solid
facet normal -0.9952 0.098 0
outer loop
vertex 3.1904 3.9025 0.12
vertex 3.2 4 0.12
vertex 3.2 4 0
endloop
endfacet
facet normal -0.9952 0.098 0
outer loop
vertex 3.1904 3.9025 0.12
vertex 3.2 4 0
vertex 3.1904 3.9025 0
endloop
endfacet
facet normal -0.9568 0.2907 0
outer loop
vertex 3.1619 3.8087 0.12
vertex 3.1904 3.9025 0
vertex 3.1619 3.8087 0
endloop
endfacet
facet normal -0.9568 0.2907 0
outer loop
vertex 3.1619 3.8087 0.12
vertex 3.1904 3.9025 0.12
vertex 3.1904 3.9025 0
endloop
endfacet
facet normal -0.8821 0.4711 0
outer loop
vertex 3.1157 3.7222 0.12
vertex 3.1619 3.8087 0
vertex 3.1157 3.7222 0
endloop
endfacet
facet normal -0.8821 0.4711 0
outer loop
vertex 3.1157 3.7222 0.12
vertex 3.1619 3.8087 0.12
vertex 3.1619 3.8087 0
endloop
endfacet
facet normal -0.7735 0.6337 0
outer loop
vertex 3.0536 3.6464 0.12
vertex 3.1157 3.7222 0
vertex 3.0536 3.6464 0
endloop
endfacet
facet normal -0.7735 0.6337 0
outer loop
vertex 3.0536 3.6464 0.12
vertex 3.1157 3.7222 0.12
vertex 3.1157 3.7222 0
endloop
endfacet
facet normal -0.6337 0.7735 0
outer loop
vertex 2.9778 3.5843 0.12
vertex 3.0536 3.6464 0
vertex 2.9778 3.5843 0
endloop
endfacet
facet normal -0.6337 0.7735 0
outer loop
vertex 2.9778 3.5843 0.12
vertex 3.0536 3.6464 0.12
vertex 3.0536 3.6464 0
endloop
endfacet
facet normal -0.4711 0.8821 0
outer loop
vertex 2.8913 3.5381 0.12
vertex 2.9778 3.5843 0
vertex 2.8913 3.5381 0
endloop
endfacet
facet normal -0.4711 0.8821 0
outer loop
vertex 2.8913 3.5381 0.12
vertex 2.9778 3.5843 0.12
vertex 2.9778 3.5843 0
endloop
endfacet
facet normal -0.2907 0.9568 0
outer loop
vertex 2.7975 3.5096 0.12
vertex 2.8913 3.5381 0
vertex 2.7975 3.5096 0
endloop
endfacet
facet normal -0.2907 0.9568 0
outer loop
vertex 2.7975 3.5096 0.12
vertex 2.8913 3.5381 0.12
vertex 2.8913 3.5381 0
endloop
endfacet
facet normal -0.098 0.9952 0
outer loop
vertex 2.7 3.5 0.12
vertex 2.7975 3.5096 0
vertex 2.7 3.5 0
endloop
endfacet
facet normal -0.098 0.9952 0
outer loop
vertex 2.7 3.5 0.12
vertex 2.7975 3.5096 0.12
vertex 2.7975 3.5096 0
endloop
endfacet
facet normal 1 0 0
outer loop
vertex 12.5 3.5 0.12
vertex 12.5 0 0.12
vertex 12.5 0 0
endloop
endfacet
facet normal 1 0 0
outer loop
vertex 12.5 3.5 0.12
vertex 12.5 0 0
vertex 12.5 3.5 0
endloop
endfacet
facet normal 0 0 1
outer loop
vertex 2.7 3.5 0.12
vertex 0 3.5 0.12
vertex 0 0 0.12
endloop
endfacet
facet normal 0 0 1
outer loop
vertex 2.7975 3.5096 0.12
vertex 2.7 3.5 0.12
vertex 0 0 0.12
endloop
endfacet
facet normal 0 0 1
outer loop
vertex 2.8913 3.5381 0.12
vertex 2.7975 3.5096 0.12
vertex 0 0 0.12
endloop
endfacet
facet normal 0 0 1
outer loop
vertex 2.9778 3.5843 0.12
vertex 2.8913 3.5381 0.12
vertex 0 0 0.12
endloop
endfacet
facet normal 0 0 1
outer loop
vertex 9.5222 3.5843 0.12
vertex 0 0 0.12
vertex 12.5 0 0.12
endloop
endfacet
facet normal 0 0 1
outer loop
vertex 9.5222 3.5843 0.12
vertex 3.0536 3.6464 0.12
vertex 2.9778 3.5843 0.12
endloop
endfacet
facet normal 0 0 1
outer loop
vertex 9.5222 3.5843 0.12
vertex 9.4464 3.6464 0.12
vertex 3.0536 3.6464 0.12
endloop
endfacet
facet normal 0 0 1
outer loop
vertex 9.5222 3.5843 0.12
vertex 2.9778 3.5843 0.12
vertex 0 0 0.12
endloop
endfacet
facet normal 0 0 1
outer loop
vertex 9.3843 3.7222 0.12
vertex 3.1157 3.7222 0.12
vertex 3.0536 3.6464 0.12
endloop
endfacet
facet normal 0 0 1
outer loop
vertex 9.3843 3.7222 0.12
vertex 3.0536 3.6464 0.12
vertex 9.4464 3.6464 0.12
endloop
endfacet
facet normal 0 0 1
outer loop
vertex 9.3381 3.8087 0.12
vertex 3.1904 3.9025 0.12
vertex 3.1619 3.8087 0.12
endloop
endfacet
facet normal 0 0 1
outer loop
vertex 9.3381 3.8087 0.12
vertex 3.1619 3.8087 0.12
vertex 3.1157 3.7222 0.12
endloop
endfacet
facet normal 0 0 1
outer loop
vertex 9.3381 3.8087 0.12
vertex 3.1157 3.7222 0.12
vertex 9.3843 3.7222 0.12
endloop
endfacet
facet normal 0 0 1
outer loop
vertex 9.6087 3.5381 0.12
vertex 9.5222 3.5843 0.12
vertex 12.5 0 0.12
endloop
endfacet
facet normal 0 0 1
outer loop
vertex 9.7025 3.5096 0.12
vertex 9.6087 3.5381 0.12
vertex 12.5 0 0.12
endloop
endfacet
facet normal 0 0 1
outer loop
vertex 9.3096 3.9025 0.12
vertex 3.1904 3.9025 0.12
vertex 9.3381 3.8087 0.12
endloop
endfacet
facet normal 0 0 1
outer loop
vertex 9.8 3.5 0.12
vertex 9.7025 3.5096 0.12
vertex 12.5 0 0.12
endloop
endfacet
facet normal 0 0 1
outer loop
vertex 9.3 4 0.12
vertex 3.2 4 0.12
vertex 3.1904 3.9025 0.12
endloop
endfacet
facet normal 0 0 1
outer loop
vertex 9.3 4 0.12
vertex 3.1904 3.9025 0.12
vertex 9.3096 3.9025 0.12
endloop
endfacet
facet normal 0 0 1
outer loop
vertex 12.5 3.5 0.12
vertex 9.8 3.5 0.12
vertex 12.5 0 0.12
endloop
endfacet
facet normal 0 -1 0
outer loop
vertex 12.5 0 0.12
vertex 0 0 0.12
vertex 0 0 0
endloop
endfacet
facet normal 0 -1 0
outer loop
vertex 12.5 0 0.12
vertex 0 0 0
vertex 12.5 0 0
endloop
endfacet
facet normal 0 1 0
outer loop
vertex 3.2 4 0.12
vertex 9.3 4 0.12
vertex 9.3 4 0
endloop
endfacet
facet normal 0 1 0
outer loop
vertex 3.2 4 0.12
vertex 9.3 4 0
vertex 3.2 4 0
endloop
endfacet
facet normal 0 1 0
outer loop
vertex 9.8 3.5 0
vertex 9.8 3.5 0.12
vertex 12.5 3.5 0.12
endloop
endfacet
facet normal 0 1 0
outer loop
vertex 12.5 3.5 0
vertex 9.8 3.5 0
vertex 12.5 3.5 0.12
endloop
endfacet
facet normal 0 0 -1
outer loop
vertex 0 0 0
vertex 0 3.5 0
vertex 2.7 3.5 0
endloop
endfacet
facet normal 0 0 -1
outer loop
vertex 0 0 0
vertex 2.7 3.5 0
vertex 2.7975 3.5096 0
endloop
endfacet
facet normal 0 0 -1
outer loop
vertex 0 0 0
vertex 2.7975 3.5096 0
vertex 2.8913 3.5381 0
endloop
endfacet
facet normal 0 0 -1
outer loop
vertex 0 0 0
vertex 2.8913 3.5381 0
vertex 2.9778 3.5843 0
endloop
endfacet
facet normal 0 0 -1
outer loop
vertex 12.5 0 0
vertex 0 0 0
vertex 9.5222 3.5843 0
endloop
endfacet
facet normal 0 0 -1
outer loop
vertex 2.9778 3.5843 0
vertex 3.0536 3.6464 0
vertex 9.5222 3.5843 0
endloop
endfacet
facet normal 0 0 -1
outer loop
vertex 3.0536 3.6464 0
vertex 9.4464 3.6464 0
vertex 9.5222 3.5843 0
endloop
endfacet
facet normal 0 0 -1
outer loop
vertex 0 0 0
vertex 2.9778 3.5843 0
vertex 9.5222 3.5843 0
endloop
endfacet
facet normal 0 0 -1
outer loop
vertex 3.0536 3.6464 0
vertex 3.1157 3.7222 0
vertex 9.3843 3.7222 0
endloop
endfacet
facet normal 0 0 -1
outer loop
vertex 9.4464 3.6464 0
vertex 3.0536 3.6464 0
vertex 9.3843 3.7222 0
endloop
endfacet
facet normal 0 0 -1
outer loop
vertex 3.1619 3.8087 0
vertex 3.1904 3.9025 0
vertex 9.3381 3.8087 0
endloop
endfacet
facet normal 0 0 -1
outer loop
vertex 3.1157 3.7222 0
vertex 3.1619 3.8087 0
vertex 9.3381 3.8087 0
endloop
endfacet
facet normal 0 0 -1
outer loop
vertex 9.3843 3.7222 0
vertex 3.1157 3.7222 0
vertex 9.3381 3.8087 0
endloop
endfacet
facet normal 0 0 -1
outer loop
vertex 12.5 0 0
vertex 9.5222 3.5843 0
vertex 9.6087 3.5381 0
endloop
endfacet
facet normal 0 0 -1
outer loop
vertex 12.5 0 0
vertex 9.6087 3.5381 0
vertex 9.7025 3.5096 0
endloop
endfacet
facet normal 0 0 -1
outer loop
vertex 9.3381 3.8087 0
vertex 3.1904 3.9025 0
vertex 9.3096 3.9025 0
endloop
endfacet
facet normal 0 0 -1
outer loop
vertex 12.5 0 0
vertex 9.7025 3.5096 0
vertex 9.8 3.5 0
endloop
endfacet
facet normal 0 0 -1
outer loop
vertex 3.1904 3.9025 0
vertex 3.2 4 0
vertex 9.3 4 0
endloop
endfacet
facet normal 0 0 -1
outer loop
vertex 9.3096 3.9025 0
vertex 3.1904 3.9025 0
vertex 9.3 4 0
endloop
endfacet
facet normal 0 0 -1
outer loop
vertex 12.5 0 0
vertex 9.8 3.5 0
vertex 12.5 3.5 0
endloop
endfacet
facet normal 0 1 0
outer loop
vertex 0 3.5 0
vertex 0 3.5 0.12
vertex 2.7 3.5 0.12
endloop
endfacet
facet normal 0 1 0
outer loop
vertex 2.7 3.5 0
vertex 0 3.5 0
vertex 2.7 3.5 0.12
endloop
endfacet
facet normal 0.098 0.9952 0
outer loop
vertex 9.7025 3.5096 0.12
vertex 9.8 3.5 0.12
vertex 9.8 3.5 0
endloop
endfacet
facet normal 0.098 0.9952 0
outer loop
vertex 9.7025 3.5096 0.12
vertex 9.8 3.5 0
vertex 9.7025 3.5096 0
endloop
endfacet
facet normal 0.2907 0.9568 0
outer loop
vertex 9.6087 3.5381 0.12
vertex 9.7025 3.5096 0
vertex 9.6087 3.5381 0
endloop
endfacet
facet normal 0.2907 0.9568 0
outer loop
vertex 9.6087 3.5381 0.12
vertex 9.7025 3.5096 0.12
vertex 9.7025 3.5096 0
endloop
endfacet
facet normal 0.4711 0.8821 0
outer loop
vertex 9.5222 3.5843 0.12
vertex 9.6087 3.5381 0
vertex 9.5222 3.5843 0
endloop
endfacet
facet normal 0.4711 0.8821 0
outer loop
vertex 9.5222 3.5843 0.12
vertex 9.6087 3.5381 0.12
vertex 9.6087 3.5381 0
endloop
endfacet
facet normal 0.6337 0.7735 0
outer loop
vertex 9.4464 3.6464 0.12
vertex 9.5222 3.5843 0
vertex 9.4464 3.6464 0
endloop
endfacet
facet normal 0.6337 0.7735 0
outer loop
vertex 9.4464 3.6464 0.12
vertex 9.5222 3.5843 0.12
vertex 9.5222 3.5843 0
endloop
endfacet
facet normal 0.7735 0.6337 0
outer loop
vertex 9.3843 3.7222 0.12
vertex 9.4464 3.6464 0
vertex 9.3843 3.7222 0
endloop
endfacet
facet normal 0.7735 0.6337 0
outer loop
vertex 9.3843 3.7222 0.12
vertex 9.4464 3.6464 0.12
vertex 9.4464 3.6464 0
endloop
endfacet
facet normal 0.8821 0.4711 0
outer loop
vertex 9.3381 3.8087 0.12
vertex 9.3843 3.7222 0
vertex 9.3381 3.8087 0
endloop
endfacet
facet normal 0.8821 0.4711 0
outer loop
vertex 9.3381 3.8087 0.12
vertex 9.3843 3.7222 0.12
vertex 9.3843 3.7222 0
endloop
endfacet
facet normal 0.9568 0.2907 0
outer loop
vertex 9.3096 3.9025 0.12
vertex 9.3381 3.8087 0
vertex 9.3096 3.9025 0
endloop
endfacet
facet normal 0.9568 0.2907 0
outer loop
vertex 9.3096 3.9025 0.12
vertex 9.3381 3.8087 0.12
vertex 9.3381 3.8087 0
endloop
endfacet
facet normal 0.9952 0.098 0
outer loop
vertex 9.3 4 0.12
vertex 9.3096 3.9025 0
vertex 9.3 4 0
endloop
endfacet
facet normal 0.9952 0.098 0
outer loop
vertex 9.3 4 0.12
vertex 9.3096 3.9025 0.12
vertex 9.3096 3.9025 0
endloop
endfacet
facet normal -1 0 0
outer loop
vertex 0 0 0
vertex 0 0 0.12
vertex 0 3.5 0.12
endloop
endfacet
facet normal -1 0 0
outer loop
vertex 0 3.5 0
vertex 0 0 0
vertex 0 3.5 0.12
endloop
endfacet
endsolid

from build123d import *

# Parameters (mm, degrees)
SKETCH1_W           = 12.5
SKETCH1_H           = 3.5
BOSS_EXTRUDE1_DEPTH = 0.12


with BuildPart() as part:
    # Sketch1 → Boss-Extrude1 (new body)
    with BuildSketch(Plane.XY.offset(0.12)):
        with Locations((6.25, 1.75)):
            Rectangle(SKETCH1_W, SKETCH1_H)
        with BuildLine():
            ThreePointArc((3.2, 4), (3.053553391, 3.646446609), (2.7, 3.5))
            Line((2.7, 3.5), (9.8, 3.5))
            ThreePointArc((9.8, 3.5), (9.446446609, 3.646446609), (9.3, 4))
            Line((9.3, 4), (3.2, 4))
        make_face()
    extrude(amount=-BOSS_EXTRUDE1_DEPTH)


solid = part.part
